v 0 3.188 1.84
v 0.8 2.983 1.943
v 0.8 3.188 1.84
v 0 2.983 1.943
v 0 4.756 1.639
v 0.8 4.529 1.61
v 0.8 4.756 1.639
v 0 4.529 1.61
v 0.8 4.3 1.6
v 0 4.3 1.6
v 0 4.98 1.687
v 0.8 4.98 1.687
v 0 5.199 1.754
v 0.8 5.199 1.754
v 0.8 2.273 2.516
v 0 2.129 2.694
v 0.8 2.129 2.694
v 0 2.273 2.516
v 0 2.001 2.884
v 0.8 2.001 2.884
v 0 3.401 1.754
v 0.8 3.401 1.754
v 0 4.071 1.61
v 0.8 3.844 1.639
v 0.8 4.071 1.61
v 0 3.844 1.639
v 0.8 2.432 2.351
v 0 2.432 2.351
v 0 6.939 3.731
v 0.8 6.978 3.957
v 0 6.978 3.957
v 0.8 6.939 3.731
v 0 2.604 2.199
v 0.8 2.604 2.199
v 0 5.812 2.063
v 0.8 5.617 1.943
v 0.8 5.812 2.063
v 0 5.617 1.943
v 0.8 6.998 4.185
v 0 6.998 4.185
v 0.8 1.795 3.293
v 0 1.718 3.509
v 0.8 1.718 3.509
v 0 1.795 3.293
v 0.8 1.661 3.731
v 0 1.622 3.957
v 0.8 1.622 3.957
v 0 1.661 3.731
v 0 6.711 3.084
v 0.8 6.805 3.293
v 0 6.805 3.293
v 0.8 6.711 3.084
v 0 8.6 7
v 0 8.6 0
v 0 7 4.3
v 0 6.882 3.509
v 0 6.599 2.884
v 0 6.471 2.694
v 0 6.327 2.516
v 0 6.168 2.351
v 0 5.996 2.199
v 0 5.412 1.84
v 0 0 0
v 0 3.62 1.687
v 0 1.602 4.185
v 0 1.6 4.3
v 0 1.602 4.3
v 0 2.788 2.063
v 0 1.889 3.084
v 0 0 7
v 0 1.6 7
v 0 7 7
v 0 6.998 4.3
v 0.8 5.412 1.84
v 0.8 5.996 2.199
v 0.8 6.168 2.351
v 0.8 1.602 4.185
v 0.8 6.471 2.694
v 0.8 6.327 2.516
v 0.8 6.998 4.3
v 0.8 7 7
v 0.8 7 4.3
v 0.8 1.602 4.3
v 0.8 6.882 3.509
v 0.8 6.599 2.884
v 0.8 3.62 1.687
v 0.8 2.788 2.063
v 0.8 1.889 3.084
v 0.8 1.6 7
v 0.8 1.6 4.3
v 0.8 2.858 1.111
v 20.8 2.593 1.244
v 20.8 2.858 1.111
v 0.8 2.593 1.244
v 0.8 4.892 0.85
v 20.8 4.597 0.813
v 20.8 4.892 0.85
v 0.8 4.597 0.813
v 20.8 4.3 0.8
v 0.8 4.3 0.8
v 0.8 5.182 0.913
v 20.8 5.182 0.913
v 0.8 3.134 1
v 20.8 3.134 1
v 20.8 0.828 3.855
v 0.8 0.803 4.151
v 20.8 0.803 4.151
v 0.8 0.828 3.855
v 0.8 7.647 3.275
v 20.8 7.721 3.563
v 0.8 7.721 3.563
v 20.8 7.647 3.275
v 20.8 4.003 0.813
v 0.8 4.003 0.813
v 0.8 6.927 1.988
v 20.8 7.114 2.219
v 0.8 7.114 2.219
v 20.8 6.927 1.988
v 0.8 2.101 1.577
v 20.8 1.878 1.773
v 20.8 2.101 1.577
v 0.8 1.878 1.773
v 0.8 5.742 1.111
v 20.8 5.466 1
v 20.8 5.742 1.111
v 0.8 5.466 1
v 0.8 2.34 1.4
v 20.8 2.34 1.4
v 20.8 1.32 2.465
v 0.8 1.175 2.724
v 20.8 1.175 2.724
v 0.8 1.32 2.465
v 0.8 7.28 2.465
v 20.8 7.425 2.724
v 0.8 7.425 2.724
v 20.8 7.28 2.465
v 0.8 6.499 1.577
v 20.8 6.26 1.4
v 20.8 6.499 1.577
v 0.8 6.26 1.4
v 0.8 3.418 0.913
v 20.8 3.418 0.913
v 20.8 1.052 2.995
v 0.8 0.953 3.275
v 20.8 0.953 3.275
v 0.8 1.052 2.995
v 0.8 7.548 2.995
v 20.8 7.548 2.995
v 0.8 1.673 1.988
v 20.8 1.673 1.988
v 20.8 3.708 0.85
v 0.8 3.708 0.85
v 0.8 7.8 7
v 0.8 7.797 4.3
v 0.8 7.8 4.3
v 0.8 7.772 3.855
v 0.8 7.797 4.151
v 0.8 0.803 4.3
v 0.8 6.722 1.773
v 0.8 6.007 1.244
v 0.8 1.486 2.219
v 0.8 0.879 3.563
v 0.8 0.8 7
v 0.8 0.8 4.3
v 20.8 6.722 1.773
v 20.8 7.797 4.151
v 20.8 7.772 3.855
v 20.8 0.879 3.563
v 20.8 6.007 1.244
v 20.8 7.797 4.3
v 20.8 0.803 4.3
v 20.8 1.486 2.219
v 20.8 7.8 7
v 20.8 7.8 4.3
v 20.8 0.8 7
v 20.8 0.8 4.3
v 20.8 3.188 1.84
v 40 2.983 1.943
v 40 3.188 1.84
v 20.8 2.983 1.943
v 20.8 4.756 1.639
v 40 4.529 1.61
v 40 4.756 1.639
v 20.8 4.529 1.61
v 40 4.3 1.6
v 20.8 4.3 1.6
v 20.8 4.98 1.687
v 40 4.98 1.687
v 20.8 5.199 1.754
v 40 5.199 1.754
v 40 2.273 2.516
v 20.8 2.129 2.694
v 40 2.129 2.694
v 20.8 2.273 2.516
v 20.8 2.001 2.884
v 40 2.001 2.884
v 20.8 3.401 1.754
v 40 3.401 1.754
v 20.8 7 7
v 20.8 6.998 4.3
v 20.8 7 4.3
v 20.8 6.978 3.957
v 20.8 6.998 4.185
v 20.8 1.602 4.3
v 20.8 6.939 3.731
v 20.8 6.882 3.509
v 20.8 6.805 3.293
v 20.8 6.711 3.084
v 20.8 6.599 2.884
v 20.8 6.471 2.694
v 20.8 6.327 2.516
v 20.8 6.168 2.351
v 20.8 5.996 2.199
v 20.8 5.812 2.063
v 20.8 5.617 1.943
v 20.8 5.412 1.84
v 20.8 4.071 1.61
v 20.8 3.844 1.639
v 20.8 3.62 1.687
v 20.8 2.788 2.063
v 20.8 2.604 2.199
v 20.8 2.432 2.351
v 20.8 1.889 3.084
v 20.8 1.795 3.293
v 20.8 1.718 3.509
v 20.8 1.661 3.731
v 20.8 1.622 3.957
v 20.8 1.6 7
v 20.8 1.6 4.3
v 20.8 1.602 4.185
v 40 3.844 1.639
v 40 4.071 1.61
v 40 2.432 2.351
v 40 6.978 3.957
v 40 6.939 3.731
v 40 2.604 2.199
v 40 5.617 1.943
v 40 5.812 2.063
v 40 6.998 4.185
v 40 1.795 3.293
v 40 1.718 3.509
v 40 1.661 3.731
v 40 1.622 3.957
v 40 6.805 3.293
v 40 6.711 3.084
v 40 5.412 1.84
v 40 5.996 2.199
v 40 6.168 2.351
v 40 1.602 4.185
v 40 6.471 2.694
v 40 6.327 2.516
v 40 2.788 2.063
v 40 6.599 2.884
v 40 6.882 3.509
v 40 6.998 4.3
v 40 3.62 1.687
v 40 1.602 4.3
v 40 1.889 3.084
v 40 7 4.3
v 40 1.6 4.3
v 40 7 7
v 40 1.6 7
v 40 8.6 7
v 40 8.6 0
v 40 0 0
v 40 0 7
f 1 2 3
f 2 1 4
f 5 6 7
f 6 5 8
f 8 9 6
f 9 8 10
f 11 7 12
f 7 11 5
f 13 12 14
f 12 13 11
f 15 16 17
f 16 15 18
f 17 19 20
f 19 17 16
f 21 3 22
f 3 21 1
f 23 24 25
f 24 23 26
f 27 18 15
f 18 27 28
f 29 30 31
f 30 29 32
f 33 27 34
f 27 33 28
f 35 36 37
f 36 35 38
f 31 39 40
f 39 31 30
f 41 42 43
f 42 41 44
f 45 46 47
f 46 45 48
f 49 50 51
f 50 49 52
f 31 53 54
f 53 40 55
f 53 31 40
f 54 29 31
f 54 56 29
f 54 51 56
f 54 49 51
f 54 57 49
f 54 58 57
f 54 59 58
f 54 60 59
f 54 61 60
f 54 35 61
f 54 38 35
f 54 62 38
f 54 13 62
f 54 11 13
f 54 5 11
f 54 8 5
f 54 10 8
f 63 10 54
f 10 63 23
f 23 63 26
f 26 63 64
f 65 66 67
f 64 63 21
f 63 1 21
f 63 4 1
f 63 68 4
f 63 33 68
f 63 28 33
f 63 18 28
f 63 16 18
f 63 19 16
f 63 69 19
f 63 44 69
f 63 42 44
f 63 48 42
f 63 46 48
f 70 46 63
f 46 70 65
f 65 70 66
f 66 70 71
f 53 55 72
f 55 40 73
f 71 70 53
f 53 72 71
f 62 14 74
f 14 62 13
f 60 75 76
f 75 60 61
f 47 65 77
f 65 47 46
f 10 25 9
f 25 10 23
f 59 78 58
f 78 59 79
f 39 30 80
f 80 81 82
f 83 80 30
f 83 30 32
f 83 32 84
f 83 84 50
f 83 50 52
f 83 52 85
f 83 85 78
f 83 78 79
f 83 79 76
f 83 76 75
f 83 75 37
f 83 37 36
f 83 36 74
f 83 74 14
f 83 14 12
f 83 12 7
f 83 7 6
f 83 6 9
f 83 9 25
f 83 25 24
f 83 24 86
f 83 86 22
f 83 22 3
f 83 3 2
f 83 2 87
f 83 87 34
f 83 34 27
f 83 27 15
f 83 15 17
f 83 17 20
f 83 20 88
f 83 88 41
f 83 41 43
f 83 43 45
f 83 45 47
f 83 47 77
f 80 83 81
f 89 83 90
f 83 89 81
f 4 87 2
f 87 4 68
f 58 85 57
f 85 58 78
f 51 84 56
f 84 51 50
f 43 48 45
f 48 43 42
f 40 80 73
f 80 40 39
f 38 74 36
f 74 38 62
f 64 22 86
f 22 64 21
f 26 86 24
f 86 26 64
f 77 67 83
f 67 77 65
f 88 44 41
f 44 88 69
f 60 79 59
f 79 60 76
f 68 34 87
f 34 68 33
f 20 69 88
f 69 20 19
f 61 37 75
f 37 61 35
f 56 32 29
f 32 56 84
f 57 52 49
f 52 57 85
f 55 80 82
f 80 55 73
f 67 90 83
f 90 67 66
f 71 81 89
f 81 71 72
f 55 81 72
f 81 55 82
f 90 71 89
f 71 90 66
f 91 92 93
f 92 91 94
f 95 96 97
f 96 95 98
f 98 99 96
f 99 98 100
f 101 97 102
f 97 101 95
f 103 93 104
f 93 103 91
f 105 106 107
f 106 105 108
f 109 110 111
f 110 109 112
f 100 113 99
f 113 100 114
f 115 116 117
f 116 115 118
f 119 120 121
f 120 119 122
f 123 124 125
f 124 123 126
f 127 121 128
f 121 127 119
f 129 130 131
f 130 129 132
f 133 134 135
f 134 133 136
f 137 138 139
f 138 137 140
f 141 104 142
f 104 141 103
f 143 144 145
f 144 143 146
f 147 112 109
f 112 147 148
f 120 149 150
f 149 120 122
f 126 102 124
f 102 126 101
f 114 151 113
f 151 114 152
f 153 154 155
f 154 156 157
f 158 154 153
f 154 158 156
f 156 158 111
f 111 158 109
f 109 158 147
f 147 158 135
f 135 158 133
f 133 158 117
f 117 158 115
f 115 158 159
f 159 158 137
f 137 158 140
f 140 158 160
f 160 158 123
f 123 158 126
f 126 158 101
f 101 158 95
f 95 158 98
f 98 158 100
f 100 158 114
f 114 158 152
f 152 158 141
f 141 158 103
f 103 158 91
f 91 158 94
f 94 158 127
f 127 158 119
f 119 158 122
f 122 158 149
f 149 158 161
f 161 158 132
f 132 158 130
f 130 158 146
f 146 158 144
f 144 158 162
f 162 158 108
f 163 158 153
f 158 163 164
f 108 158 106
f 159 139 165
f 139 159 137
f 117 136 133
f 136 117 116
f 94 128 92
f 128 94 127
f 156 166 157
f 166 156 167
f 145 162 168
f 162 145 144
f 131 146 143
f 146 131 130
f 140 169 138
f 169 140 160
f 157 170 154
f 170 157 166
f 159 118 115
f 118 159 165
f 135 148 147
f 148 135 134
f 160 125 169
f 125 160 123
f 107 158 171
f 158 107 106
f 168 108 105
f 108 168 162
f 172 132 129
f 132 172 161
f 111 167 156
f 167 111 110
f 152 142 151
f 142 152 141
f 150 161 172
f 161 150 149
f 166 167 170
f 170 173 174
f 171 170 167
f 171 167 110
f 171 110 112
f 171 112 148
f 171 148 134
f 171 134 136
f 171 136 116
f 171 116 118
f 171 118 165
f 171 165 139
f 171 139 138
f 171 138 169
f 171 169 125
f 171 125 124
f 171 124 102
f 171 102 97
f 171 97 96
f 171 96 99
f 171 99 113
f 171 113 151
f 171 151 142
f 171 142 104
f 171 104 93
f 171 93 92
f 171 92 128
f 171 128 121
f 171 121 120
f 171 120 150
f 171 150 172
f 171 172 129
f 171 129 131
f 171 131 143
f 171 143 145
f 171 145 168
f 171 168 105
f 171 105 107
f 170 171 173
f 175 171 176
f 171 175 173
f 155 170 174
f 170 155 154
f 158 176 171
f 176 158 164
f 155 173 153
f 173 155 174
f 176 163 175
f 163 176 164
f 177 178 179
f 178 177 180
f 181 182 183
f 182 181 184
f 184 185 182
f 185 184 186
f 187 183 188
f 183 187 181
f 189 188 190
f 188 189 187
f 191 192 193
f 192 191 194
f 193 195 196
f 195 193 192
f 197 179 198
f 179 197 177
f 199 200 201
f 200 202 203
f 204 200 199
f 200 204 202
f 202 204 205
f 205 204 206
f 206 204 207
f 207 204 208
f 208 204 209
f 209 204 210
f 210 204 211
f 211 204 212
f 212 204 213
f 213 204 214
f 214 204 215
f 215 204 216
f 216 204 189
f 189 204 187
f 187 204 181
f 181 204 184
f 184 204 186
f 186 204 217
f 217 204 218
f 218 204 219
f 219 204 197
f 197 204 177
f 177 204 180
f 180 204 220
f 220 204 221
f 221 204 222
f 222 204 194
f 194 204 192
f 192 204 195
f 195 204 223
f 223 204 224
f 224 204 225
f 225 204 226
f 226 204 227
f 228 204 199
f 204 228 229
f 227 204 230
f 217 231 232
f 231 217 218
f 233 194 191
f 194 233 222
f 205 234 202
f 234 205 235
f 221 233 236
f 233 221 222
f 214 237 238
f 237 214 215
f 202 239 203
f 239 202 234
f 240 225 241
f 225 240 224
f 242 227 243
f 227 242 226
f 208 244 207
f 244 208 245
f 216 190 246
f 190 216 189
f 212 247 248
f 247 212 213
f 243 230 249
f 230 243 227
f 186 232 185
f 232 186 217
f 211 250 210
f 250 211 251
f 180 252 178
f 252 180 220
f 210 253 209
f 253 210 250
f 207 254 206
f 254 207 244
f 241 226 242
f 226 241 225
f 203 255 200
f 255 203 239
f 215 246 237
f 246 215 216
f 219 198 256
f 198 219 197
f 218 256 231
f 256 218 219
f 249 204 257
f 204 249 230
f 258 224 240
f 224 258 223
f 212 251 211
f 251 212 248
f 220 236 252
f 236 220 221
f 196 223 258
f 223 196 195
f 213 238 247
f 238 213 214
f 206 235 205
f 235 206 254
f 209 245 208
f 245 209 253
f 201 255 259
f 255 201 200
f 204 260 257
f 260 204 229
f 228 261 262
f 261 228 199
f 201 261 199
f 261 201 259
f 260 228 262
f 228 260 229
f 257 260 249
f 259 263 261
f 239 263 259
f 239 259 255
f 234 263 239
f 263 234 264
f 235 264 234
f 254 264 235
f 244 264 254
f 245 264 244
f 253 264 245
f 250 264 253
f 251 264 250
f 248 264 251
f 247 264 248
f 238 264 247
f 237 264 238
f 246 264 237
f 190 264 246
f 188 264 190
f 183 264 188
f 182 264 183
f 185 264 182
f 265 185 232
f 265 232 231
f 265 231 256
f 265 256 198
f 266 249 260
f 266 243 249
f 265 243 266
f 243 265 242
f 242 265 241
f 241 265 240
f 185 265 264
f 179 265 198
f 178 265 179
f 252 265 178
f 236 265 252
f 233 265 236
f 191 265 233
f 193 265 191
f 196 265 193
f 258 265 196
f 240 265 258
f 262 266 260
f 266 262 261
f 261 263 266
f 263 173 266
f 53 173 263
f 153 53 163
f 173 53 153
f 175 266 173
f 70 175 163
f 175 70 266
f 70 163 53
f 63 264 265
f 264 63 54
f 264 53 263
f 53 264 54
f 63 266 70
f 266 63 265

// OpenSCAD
$fn = 74;

engine_d = 7;
engine_l = 20;
engine_wall = 0.4*2;



difference()
{
    engine_holder(engine_d, engine_l*2, engine_wall);
    translate([0, engine_d/2 + engine_wall, engine_wall])
    engine_body(engine_d, engine_l, engine_wall, 20);
}

module engine_holder(width, length, wall)
{
    //rotate([0, 0,0])
    cube([length, width+2*engine_wall, width]);
}

module engine_body(engine_d, engine_l, engine_wall, tail = engine_wall)
{
    translate([0,0,engine_d/2])
    rotate([0, 90,0])
    {
        cube_cylinder(engine_d - 2*engine_wall, engine_wall);
        translate([0,0, engine_wall])
        cube_cylinder(engine_d, engine_l);
        translate([0,0, engine_wall+engine_l])
        cube_cylinder(engine_d - 2*engine_wall, tail);
    }
}

module cube_cylinder(d, l)
{
    cylinder(d = d, h = l);
    translate([-d/2, -d/2, 0])
    cube([d/2, d, l]);
}


//    cube_width = engine_d + 2*engine_wall;

//        translate([-cube_width/2, -cube_width/2, 0])
//        cube([cube_width, cube_width, engine_l]);
